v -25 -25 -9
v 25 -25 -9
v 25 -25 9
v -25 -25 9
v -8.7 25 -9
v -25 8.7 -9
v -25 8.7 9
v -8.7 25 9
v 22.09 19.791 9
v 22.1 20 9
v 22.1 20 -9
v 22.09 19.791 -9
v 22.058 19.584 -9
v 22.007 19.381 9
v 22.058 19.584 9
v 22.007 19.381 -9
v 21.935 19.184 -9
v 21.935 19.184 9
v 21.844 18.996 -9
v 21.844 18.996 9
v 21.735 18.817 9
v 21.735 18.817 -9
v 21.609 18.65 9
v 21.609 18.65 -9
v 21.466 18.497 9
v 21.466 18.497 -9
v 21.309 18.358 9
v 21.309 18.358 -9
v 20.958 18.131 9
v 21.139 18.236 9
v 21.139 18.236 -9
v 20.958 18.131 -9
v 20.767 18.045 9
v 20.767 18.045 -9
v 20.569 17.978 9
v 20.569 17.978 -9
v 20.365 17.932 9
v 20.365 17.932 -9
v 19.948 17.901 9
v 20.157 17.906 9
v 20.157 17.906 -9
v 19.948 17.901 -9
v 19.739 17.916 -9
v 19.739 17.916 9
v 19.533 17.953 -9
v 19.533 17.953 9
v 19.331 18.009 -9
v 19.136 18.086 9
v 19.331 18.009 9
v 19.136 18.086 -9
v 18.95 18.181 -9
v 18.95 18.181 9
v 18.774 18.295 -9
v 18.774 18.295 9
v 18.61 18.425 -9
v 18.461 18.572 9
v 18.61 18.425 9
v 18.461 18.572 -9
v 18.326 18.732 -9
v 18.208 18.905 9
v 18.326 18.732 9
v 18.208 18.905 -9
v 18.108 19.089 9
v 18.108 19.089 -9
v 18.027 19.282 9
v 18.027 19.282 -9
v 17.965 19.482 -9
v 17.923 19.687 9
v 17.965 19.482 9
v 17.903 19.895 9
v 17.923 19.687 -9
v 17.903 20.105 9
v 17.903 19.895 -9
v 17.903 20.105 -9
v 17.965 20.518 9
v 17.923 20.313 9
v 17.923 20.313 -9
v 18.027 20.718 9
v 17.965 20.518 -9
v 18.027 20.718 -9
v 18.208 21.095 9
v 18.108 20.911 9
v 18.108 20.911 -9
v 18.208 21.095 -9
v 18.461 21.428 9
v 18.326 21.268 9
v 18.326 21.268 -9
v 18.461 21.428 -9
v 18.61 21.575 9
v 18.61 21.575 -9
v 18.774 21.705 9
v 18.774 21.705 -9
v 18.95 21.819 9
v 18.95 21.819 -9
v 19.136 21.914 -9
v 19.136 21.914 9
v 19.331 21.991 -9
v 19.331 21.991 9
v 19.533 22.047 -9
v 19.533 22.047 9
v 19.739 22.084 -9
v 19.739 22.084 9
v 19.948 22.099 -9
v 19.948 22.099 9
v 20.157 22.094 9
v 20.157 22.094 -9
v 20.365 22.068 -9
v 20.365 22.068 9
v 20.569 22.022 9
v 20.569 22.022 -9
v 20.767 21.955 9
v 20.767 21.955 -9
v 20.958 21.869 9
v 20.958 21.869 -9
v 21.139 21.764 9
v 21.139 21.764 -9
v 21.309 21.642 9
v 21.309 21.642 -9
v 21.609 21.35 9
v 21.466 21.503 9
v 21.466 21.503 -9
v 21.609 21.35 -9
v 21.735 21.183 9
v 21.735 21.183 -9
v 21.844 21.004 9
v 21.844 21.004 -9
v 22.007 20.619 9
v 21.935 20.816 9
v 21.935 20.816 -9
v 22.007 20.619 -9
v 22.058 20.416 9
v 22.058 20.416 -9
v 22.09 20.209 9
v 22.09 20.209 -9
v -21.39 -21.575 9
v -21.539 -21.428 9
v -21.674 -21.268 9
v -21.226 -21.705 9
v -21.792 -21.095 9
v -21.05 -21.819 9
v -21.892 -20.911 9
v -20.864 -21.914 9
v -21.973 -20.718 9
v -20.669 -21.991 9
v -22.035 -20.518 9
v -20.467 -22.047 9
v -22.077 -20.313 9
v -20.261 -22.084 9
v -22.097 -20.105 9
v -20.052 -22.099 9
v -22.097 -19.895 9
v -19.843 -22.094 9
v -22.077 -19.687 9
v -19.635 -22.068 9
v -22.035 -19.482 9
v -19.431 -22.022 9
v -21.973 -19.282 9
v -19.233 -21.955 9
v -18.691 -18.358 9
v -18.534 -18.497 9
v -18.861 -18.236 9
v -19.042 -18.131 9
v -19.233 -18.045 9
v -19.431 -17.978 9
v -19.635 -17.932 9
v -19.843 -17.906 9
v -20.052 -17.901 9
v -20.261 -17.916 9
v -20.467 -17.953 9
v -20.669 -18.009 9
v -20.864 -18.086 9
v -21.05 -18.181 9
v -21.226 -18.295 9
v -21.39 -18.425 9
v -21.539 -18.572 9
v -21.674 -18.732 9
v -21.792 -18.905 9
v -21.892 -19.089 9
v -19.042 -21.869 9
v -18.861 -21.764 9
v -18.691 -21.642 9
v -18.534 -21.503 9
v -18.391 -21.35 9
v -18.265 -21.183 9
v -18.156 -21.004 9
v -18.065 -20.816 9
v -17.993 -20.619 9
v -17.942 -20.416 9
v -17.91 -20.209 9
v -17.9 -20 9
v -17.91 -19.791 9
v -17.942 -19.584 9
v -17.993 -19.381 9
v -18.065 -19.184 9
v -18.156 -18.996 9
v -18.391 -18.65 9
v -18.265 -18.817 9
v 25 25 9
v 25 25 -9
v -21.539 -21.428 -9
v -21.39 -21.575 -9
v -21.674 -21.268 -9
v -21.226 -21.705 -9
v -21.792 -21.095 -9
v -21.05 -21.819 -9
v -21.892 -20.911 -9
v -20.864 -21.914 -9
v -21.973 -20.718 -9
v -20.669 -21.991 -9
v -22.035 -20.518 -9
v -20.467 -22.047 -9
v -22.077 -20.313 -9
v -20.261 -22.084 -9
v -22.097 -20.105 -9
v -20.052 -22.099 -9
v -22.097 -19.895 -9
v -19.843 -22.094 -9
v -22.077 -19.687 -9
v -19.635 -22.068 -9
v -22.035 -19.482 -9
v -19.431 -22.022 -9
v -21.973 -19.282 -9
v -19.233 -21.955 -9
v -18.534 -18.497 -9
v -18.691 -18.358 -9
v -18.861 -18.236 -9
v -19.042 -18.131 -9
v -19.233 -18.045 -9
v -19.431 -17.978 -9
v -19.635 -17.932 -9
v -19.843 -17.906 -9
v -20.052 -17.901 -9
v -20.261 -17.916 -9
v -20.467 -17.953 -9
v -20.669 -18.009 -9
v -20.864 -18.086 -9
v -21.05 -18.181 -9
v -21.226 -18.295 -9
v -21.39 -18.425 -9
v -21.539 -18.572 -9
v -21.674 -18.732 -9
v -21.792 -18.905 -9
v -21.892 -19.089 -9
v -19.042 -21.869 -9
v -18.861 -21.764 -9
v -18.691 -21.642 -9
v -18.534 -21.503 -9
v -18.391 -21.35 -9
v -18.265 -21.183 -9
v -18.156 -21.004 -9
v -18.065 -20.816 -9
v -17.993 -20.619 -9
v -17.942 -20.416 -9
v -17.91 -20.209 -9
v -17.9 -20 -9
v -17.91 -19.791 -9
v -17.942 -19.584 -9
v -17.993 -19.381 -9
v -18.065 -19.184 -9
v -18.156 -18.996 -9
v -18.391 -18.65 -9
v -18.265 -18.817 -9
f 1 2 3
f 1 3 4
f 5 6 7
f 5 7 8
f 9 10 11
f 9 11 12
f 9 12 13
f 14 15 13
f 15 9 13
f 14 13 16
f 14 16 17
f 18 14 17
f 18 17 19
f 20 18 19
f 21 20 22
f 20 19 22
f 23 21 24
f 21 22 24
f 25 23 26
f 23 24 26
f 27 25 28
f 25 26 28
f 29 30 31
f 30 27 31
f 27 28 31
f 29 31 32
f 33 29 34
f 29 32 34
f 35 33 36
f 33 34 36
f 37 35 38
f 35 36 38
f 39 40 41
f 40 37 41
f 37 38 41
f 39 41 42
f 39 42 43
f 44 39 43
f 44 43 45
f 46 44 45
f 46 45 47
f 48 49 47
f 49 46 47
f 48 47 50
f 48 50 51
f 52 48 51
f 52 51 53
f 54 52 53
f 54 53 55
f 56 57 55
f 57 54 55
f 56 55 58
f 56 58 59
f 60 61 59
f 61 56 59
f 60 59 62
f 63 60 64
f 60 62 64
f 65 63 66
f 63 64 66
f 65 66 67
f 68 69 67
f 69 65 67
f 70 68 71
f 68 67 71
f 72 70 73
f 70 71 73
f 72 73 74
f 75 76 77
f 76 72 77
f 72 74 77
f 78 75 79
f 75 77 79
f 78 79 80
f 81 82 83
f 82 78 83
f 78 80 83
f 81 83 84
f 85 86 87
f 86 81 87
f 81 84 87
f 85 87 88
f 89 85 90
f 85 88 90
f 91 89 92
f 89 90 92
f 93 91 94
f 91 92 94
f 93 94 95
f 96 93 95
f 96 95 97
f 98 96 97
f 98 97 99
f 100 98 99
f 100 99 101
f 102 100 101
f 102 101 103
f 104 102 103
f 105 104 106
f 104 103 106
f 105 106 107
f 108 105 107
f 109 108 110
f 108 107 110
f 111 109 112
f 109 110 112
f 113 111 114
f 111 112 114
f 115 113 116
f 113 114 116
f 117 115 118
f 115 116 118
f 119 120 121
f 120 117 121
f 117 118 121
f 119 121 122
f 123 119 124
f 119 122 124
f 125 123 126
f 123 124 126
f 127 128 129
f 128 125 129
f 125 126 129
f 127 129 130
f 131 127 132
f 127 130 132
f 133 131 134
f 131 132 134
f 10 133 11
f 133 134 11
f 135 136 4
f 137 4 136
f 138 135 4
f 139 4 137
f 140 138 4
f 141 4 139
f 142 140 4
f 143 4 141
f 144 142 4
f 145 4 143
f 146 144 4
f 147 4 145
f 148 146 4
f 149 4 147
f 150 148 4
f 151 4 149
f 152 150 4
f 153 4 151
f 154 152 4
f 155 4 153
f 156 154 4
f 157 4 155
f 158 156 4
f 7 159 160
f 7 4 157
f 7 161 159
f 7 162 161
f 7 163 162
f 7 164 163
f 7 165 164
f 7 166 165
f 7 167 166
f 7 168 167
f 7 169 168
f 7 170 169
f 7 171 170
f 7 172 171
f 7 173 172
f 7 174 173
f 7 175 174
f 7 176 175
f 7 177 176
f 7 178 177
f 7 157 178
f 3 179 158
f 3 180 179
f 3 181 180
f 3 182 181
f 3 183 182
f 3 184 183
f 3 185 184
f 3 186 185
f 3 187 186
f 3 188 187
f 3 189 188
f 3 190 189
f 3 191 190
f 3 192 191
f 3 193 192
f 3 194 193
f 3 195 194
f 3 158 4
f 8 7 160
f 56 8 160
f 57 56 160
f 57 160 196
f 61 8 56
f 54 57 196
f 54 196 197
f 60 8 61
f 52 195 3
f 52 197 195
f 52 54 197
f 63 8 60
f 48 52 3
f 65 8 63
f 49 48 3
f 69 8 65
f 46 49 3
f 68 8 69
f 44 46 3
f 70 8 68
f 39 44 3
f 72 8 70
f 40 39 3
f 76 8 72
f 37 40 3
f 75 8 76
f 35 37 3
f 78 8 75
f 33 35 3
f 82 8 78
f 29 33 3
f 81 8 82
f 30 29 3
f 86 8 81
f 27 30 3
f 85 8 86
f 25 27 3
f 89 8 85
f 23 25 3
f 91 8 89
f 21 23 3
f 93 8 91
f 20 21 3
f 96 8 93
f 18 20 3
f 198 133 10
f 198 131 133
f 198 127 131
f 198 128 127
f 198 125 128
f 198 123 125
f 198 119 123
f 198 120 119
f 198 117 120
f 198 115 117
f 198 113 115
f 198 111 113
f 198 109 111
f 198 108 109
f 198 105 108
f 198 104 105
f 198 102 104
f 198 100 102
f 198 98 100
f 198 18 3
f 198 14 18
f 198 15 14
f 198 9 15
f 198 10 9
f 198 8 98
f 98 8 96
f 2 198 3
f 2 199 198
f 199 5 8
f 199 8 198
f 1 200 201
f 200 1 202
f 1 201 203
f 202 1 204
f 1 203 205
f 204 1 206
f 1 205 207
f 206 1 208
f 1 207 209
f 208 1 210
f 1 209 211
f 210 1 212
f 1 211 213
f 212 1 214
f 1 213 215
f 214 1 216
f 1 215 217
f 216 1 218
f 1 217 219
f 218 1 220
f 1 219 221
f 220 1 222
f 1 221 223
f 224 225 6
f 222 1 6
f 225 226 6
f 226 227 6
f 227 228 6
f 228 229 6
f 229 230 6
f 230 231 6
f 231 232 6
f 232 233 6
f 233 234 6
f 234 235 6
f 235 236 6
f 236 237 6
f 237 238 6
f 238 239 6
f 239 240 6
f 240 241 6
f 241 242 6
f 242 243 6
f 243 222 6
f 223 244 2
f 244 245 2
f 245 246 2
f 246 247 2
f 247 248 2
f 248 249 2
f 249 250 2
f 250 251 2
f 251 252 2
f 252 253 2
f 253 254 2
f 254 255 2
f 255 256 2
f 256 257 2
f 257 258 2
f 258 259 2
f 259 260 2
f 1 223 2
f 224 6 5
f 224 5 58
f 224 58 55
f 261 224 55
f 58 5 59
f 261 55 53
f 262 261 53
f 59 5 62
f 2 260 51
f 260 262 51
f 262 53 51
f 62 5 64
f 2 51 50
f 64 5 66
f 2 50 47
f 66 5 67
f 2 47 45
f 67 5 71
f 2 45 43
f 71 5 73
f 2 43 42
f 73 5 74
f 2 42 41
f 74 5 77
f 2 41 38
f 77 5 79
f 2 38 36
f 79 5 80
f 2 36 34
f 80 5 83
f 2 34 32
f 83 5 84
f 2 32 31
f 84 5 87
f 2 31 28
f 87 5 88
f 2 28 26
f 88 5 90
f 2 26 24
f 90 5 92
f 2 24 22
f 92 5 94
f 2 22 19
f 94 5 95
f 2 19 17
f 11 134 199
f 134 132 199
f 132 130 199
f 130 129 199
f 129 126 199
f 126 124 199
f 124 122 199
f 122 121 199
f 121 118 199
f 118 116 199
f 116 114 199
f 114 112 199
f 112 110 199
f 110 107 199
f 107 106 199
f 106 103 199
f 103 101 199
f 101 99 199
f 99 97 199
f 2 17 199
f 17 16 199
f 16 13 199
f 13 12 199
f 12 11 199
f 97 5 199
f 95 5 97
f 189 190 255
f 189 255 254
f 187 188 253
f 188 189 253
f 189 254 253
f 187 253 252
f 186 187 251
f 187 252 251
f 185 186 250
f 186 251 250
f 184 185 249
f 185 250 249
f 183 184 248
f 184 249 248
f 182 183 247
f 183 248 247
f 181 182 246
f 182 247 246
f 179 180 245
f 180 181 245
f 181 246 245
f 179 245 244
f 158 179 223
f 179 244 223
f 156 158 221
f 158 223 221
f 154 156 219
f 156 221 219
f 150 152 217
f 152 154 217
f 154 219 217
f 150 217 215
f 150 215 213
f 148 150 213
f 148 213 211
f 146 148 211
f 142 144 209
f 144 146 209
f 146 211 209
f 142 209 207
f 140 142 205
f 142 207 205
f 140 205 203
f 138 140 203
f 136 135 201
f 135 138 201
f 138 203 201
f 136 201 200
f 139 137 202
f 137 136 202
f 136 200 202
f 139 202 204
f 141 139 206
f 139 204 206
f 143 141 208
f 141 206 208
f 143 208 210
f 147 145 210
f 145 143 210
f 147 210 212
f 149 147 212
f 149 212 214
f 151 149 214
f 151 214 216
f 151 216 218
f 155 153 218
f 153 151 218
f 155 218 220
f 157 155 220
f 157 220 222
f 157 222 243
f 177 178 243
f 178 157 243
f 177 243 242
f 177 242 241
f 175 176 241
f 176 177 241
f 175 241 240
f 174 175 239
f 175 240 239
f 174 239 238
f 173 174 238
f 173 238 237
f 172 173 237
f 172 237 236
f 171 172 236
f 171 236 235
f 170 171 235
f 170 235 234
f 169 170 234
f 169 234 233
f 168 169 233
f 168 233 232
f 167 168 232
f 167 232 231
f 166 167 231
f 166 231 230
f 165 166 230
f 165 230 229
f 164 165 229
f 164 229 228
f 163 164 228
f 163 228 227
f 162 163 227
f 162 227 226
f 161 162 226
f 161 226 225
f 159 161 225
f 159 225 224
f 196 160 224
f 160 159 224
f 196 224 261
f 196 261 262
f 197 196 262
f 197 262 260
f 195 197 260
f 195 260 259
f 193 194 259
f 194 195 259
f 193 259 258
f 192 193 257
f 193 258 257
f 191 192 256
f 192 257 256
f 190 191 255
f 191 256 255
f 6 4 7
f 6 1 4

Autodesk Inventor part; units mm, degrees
ref_plane "YZ Plane" through (0, 0, 0) normal (1, 0, 0) x (0, 1, 0)
ref_plane "XZ Plane" through (0, 0, 0) normal (0, 1, 0) x (-1, 0, 0)
ref_plane "XY Plane" through (0, 0, 0) normal (0, 0, 1) x (1, 0, 0)
sketch "Náčrt1" plane through (0, 0, 0) normal (0, 0, 1) x (1, 0, 0)
  line L0 (-25, 25) -> (25, 25)
  line L1 (25, 25) -> (25, -25)
  line L2 (25, -25) -> (-25, -25)
  line L3 (-25, -25) -> (-25, 25)
  line L4 (-25, 25) -> (25, -25) construction
  line L5 (25, 25) -> (-25, -25) construction
  line L6 (-25, 8.7) -> (-8.7, 25)
  circle A0 centre (-20, -20) radius 2.1
  circle A1 centre (20, 20) radius 2.1
  point P0 (0, 0)
  dimension "d0" = 50
  dimension "d1" = 50
  dimension "d2" = 33.7
  dimension "d3" = 45
  dimension "d4" = 4.2
  dimension "d6" = 5
  dimension "d7" = 5
extrude "Vysunutí1" add sketch "Náčrt1" along normal mid plane 18 contours L0 L1 L2 L3 L6
properties part number "Sensor"
